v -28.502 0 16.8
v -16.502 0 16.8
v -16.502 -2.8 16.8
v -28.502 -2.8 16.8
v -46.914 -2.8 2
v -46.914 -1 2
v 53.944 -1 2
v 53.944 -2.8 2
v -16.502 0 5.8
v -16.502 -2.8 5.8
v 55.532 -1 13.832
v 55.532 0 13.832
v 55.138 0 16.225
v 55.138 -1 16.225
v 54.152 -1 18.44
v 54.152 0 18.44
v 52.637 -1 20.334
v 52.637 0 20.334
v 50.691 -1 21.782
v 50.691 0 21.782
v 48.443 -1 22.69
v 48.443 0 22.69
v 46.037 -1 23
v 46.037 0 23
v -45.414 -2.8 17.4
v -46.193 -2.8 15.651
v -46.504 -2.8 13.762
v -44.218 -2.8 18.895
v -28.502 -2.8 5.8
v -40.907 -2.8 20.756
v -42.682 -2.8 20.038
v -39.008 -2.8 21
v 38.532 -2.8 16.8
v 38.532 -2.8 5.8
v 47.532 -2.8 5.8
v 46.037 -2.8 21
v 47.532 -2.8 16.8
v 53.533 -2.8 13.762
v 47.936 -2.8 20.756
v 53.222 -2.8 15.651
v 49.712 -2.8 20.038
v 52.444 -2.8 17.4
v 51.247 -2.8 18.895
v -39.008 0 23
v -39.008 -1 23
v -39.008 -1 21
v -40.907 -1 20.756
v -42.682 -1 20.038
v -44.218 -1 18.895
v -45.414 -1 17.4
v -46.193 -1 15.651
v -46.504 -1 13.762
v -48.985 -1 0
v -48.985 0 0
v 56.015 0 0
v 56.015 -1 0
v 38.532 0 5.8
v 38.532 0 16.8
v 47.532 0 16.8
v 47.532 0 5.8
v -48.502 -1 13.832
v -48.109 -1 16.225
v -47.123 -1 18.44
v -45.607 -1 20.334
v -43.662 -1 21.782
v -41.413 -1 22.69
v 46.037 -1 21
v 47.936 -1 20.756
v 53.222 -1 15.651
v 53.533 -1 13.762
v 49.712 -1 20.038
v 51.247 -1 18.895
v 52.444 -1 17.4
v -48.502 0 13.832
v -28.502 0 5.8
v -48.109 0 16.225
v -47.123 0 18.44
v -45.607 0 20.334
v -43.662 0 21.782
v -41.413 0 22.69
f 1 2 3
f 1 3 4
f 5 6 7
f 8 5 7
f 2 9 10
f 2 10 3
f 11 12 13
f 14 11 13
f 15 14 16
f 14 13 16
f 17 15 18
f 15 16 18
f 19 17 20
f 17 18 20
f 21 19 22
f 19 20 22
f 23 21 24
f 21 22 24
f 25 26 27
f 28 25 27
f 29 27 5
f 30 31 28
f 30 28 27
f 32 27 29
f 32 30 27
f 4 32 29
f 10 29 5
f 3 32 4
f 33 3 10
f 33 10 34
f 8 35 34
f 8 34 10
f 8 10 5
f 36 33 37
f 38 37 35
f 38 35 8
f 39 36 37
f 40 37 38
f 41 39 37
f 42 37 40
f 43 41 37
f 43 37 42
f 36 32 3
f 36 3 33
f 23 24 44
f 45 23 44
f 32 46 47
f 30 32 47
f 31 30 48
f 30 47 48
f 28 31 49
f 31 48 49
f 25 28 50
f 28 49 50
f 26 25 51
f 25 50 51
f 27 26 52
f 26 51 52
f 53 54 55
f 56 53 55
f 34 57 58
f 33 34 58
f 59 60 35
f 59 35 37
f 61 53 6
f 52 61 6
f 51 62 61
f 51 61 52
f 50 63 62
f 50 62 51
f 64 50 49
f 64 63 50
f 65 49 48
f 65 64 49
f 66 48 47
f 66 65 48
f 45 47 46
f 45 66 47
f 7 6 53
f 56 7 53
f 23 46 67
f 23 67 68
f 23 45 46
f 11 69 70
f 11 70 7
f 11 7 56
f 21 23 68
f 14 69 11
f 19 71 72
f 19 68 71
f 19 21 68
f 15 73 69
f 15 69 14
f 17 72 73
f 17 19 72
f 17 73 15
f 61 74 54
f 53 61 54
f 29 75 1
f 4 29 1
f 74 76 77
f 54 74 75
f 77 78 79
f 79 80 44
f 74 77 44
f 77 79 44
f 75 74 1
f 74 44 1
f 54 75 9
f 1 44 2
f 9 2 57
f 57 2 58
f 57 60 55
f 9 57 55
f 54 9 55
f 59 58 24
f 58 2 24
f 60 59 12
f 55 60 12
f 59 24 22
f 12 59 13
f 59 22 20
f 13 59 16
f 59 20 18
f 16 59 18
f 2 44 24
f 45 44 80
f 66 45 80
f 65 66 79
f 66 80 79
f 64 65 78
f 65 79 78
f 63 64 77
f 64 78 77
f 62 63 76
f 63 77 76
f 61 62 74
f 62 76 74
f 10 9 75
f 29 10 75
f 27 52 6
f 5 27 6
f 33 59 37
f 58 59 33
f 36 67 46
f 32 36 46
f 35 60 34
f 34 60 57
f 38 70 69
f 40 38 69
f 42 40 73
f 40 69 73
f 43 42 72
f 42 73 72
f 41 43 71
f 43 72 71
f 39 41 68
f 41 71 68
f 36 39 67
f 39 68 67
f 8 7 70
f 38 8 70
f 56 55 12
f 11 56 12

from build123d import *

# Parameters (mm, degrees)
F1_DEPTH = 1
F3_DEPTH = 1.8
F4_W     = 9
F4_H     = 11
F4_W_2   = 12
F5_DEPTH = 2.801


with BuildPart() as f1:
    # F0 (on Front) → F1 (new body)
    with BuildSketch(Plane.XZ):
        with BuildLine():
            Line((-48.502349, 13.831545), (-48.985357, 0))
            Line((-48.985357, 0), (56.014643, 0))
            Line((56.014643, 0), (55.531635, 13.831545))
            ThreePointArc((55.531635, 13.831545), (52.636676, 20.333728), (46.037422, 23))
            Line((46.037422, 23), (-39.008136, 23))
            ThreePointArc((-39.008136, 23), (-45.607391, 20.333728), (-48.502349, 13.831545))
        make_face()
    extrude(amount=F1_DEPTH)

    # F2 (on face) → F3 (join)
    with BuildSketch(Plane.XZ.offset(1)):
        with BuildLine():
            Line((46.037422, 21), (-39.008136, 21))
            ThreePointArc((-39.008136, 21), (-44.218074, 18.895049), (-46.503567, 13.761746))
            Line((-46.503567, 13.761746), (-46.914297, 2))
            Line((-46.914297, 2), (53.943582, 2))
            Line((53.943582, 2), (53.532853, 13.761746))
            ThreePointArc((53.532853, 13.761746), (51.24736, 18.895049), (46.037422, 21))
        make_face()
    extrude(amount=F3_DEPTH)

    # F4 (on face) → F5 (cut, through all)
    with BuildSketch(Plane(origin=(0, 0, 0), x_dir=(-1, 0, 0), z_dir=(0, 1, 0))):
        with Locations((-43.031635, 11.3)):
            Rectangle(F4_W, F4_H)
        with Locations((22.502349, 11.3)):
            Rectangle(F4_W_2, F4_H)
    extrude(amount=-F5_DEPTH, mode=Mode.SUBTRACT)


solid = f1.part
